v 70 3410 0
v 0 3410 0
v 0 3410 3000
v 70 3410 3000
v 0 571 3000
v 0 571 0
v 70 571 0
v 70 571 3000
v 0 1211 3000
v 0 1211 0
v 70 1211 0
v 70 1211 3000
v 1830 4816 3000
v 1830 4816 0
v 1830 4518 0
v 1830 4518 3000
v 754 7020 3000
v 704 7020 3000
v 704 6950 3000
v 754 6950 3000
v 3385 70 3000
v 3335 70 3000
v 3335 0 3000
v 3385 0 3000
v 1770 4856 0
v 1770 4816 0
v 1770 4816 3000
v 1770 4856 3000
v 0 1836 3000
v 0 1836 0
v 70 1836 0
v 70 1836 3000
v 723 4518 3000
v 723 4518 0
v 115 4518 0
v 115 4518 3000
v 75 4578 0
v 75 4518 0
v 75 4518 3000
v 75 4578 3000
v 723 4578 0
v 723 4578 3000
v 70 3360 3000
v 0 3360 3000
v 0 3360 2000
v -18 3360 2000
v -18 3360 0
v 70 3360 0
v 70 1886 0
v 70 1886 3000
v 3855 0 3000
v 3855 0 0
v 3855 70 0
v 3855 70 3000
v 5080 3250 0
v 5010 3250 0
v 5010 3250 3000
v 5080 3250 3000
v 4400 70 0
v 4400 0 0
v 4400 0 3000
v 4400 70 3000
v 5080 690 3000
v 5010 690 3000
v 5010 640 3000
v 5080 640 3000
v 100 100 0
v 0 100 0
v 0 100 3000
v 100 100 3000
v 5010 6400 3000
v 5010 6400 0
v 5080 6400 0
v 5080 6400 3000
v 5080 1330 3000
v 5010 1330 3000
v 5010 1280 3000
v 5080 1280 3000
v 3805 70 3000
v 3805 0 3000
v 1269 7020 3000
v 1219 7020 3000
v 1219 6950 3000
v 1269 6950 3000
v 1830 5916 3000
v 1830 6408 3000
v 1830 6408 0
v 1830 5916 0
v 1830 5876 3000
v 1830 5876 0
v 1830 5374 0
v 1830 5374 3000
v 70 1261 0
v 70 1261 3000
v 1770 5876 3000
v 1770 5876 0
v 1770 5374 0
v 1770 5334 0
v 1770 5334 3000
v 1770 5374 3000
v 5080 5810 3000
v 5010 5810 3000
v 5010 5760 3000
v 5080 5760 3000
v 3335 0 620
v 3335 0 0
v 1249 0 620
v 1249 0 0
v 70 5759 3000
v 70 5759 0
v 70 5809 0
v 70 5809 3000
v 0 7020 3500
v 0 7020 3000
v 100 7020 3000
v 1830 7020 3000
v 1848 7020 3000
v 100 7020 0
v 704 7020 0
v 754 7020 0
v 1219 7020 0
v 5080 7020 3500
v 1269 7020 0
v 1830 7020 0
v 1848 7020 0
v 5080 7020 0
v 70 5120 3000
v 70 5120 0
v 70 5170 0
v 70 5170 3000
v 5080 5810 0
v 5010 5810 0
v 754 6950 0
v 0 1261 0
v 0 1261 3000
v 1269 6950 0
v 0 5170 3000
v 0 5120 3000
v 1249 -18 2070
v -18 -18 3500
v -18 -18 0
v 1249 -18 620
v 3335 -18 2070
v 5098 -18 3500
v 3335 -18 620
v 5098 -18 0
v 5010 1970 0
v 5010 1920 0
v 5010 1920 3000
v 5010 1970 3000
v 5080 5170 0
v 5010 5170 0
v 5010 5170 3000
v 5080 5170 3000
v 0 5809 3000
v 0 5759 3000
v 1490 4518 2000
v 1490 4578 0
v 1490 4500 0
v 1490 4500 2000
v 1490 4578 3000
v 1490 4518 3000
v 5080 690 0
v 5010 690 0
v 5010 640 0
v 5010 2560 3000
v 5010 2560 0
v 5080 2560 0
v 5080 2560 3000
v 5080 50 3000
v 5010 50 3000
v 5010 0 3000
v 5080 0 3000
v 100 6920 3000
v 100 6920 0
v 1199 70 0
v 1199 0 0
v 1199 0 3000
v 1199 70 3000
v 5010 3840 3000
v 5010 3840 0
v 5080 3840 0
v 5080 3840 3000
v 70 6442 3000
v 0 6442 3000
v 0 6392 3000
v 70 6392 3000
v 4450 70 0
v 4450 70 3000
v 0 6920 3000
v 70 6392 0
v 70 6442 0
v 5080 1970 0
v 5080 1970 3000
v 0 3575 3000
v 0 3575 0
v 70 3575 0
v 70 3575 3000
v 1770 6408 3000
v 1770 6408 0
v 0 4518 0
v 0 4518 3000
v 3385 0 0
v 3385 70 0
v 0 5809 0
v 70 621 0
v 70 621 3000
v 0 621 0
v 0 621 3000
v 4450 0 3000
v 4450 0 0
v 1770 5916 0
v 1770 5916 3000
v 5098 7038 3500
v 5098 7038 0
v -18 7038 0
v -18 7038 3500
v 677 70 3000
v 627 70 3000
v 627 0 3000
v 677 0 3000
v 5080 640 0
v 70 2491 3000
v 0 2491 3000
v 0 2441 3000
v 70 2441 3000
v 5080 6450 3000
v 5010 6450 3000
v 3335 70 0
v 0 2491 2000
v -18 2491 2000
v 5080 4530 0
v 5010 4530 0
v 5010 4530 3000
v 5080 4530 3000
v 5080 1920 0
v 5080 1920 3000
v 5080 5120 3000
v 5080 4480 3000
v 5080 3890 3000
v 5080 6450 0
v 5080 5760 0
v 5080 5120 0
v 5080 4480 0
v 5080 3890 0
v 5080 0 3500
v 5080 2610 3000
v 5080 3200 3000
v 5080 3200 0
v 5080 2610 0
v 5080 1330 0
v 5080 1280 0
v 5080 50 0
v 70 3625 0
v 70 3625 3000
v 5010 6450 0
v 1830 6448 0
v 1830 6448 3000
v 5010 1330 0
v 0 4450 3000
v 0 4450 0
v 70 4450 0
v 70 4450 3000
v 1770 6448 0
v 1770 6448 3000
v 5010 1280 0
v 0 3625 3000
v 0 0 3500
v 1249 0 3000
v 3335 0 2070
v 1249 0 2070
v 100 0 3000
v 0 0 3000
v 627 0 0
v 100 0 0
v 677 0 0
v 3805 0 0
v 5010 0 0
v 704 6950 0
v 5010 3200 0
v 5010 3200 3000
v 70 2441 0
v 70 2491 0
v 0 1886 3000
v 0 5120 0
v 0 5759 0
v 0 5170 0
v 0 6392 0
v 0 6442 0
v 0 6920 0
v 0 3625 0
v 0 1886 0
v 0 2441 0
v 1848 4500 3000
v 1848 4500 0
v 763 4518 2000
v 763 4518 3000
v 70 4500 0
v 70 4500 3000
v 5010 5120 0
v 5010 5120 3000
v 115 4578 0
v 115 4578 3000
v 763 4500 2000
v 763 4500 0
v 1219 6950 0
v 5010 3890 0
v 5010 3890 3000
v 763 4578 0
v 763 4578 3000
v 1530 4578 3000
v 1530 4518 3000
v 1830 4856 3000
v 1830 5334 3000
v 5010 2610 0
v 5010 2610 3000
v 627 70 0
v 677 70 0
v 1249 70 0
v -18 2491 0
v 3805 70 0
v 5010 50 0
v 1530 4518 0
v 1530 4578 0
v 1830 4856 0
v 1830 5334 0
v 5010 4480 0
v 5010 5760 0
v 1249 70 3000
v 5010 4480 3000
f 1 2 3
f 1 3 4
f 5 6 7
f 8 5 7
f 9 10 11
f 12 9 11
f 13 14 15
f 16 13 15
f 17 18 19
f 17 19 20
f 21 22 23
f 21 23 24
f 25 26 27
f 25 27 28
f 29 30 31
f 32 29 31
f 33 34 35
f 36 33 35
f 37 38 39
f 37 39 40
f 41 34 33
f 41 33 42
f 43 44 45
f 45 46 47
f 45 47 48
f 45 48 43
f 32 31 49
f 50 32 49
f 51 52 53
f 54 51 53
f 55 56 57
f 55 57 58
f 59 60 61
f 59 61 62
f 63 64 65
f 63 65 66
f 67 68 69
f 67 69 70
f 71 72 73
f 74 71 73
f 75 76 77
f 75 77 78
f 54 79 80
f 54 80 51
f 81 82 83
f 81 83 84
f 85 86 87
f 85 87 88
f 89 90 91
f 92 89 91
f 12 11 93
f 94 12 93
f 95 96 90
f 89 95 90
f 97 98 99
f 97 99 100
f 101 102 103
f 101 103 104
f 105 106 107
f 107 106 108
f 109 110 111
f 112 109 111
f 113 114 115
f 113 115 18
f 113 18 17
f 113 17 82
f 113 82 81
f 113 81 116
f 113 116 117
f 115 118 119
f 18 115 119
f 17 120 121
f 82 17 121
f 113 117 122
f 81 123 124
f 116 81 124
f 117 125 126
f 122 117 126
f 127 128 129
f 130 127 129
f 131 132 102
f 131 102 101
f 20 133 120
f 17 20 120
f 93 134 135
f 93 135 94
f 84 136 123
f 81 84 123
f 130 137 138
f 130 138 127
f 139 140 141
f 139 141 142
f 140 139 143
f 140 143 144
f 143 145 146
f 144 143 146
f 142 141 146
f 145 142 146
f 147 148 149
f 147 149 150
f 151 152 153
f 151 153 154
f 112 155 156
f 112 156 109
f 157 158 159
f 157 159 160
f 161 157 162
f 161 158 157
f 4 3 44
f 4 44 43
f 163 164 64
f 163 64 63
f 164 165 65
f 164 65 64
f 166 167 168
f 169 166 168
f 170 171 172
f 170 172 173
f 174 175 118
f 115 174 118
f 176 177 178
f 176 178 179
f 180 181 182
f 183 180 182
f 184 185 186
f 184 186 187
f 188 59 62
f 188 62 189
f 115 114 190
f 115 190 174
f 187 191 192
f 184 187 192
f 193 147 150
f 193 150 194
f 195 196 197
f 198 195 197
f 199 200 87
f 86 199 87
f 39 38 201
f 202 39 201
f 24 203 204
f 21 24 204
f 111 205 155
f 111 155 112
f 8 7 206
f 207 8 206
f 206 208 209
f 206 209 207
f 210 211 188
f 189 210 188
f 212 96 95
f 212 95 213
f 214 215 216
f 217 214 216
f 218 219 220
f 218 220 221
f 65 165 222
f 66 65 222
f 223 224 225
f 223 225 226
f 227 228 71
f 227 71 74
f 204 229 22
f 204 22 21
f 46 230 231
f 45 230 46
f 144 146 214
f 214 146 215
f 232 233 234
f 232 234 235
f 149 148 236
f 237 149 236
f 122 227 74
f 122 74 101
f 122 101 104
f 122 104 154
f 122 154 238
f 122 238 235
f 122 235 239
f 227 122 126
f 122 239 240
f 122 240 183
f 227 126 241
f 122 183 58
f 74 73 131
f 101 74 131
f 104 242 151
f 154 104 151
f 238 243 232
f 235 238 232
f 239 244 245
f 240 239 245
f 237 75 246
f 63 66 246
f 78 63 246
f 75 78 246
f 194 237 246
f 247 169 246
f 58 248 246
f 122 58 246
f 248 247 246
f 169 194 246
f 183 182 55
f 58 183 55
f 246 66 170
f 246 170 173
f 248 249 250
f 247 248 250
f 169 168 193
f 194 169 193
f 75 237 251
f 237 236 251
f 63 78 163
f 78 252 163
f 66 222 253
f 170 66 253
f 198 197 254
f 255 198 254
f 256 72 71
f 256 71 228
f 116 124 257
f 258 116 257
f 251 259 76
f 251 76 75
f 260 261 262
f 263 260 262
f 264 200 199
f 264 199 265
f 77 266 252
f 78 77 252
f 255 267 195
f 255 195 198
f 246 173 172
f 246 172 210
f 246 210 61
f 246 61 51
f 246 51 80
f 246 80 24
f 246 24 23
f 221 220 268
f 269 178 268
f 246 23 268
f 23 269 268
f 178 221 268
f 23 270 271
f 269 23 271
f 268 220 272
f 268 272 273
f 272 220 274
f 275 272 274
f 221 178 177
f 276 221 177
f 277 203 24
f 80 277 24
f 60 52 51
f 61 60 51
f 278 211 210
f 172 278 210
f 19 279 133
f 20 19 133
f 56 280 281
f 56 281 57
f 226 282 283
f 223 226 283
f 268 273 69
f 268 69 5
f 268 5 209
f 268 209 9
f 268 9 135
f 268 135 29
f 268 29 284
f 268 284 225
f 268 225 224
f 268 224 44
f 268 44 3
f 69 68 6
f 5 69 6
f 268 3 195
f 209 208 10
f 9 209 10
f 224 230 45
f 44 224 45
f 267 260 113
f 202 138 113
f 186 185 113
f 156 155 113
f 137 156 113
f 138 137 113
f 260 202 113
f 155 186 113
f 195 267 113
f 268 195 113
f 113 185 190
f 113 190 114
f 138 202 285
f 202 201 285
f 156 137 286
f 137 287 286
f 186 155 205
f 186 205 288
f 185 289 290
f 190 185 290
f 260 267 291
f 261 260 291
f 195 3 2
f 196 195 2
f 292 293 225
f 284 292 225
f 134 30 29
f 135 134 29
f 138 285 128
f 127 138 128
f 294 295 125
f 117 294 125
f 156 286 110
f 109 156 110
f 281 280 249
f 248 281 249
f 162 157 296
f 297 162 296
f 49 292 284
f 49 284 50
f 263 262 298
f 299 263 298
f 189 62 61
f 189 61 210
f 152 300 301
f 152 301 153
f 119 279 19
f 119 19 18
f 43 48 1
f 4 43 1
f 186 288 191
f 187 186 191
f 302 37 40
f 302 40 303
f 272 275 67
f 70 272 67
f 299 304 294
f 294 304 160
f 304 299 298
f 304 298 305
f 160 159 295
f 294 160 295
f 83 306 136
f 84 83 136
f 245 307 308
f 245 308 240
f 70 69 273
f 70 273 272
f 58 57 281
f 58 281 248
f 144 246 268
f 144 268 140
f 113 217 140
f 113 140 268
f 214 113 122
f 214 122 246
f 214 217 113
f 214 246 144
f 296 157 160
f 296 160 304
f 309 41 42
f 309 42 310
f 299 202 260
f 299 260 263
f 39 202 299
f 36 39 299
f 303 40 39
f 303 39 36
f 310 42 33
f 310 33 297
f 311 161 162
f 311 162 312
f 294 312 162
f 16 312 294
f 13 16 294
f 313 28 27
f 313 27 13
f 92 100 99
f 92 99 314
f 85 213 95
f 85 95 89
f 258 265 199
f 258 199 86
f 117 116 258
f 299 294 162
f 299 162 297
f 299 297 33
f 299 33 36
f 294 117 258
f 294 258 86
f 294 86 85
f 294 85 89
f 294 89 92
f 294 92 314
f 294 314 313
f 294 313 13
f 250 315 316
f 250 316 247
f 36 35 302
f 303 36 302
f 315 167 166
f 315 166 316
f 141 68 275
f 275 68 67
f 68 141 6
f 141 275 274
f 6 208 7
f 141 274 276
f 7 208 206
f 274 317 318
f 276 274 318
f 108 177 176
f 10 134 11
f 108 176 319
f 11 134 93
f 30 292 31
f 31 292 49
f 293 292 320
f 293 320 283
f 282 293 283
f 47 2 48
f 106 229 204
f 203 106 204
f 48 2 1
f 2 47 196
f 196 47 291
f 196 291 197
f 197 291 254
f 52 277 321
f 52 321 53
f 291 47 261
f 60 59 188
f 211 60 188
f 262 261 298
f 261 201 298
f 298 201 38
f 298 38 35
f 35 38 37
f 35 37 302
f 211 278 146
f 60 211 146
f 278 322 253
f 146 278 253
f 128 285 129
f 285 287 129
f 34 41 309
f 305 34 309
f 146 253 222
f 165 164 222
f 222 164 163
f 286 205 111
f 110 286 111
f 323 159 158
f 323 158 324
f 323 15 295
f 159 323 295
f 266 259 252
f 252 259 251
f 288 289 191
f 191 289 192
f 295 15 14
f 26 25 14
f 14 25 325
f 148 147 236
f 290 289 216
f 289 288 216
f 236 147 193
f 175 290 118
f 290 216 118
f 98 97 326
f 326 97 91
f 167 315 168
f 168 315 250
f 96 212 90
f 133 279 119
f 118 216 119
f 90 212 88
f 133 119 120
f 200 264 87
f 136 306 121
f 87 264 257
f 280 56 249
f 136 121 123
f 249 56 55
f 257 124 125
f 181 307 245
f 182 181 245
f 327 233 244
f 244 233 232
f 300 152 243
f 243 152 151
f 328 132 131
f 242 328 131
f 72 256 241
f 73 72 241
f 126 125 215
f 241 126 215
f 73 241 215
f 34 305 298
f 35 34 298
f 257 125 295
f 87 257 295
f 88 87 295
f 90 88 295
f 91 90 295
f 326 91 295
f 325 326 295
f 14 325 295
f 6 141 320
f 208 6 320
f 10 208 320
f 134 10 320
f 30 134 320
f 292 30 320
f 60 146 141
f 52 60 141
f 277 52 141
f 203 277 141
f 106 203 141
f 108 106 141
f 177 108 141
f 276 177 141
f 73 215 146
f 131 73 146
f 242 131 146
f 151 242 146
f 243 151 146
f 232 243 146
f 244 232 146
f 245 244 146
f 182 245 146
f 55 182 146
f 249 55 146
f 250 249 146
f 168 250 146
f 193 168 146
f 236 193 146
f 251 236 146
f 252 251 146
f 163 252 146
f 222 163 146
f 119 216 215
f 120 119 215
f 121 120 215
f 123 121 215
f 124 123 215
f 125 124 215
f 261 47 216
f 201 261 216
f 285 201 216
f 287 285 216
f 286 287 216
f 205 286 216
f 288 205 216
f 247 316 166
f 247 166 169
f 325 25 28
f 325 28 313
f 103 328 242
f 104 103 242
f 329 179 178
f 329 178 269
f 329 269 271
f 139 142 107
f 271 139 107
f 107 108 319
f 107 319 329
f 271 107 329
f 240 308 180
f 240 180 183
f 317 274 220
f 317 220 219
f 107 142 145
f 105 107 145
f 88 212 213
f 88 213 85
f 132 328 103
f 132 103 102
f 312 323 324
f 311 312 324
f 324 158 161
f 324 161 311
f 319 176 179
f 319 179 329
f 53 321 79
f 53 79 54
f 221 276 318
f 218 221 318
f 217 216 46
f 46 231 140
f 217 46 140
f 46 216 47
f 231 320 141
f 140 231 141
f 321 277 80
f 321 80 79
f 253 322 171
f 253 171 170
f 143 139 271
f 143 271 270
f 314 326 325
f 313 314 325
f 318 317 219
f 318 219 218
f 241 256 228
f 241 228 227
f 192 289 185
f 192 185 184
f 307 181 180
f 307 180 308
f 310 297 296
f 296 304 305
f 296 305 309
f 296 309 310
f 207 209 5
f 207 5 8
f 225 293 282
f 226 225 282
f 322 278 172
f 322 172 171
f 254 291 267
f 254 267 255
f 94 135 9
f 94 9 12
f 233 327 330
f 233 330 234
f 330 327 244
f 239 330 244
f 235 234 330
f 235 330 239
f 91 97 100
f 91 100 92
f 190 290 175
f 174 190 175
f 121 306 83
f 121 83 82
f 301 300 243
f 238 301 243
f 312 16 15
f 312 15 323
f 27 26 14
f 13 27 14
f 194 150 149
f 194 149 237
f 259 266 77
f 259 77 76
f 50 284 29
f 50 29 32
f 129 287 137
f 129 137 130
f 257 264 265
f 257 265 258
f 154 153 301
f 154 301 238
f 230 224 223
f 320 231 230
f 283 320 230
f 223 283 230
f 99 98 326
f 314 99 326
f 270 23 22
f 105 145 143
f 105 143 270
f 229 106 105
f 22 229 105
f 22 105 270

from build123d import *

# Parameters (mm, degrees)
F4_DEPTH  = 3500
F6_DEPTH  = 3000
F2_W      = 70
F2_H      = 50
F2_W_2    = 100
F2_H_2    = 100
F2_W_3    = 50
F2_H_3    = 70
F2_W_4    = 60
F2_H_4    = 40
F2_W_5    = 40
F2_H_5    = 60
F7_DEPTH  = 3000
F8_W      = 2086
F8_H      = 1450
F9_DEPTH  = 18
F10_W     = 869
F10_H     = 2000
F11_DEPTH = 18
F12_W     = 727
F12_H     = 2000
F13_DEPTH = 18


# Not quite as in the source:
# - a feature names something its author has since deleted; it is built from what else it names


with BuildPart() as f4:
    # F3 (on face) → F4 (new body)
    with BuildSketch(Plane.XY):
        Polygon((1830, 7038), (-18, 7038), (-18, 4500), (-18, -18), (5098, -18), (5098, 7038), align=None)
        Polygon((0, 4500), (0, 7020), (1830, 7020), (5080, 7020), (5080, 0), (0, 0), align=None, mode=Mode.SUBTRACT)
    extrude(amount=F4_DEPTH)

    # F5 (on face) → F6 (join)
    with BuildSketch(Plane.XY):
        Polygon((0, 4518), (0, 4500), (1830, 4500), (1848, 4500), (1848, 7020), (1830, 7020), (1830, 4518), align=None)
    extrude(amount=F6_DEPTH)

    # F2 (on Top) → F7 (join)
    with BuildSketch(Plane.XY):
        with Locations((35, 4475)):
            Rectangle(F2_W, F2_H)
        with Locations((35, 3600)):
            Rectangle(F2_W, F2_H)
        with Locations((35, 3385)):
            Rectangle(F2_W, F2_H)
        with Locations((35, 2466)):
            Rectangle(F2_W, F2_H)
        with Locations((35, 1861)):
            Rectangle(F2_W, F2_H)
        with Locations((35, 1236)):
            Rectangle(F2_W, F2_H)
        with Locations((35, 596)):
            Rectangle(F2_W, F2_H)
        with Locations((50, 50)):
            Rectangle(F2_W_2, F2_H_2)
        with Locations((652, 35)):
            Rectangle(F2_W_3, F2_H_3)
        with Locations((1224, 35)):
            Rectangle(F2_W_3, F2_H_3)
        with Locations((3360, 35)):
            Rectangle(F2_W_3, F2_H_3)
        with Locations((3830, 35)):
            Rectangle(F2_W_3, F2_H_3)
        with Locations((4425, 35)):
            Rectangle(F2_W_3, F2_H_3)
        with Locations((5045, 25)):
            Rectangle(F2_W, F2_H)
        with Locations((5045, 665)):
            Rectangle(F2_W, F2_H)
        with Locations((5045, 1305)):
            Rectangle(F2_W, F2_H)
        with Locations((5045, 1945)):
            Rectangle(F2_W, F2_H)
        with Locations((5045, 2585)):
            Rectangle(F2_W, F2_H)
        with Locations((5045, 3225)):
            Rectangle(F2_W, F2_H)
        with Locations((5045, 3865)):
            Rectangle(F2_W, F2_H)
        with Locations((5045, 4505)):
            Rectangle(F2_W, F2_H)
        with Locations((5045, 5145)):
            Rectangle(F2_W, F2_H)
        with Locations((5045, 5785)):
            Rectangle(F2_W, F2_H)
        with Locations((5045, 6425)):
            Rectangle(F2_W, F2_H)
        with Locations((50, 6970)):
            Rectangle(F2_W_2, F2_H_2)
        with Locations((729, 6985)):
            Rectangle(F2_W_3, F2_H_3)
        with Locations((1244, 6985)):
            Rectangle(F2_W_3, F2_H_3)
        with Locations((1800, 6428)):
            Rectangle(F2_W_4, F2_H_4)
        with Locations((1800, 5896)):
            Rectangle(F2_W_4, F2_H_4)
        with Locations((1800, 5354)):
            Rectangle(F2_W_4, F2_H_4)
        with Locations((1800, 4836)):
            Rectangle(F2_W_4, F2_H_4)
        with Locations((35, 6417)):
            Rectangle(F2_W, F2_H)
        with Locations((35, 5784)):
            Rectangle(F2_W, F2_H)
        with Locations((35, 5145)):
            Rectangle(F2_W, F2_H)
        with Locations((95, 4548)):
            Rectangle(F2_W_5, F2_H_5)
        with Locations((743, 4548)):
            Rectangle(F2_W_5, F2_H_5)
        with Locations((1510, 4548)):
            Rectangle(F2_W_5, F2_H_5)
    extrude(amount=F7_DEPTH)

    # F8 (on face) → F9 (cut, through all)
    with BuildSketch(Plane.XZ.offset(18)):
        with Locations((2292, 1345)):
            Rectangle(F8_W, F8_H)
    extrude(amount=-F9_DEPTH, mode=Mode.SUBTRACT)

    # F10 (on face) → F11 (cut, through all)
    with BuildSketch(Plane.YZ):
        with Locations((2925.5, 1000)):
            Rectangle(F10_W, F10_H)
    extrude(amount=-F11_DEPTH, mode=Mode.SUBTRACT)

    # F12 (on face) → F13 (cut, through all)
    with BuildSketch(Plane(origin=(0, 4518, 0), x_dir=(-1, 0, 0), z_dir=(0, 1, 0))):
        with Locations((-1126.5, 1000)):
            Rectangle(F12_W, F12_H)
    extrude(amount=-F13_DEPTH, mode=Mode.SUBTRACT)


solid = f4.part
